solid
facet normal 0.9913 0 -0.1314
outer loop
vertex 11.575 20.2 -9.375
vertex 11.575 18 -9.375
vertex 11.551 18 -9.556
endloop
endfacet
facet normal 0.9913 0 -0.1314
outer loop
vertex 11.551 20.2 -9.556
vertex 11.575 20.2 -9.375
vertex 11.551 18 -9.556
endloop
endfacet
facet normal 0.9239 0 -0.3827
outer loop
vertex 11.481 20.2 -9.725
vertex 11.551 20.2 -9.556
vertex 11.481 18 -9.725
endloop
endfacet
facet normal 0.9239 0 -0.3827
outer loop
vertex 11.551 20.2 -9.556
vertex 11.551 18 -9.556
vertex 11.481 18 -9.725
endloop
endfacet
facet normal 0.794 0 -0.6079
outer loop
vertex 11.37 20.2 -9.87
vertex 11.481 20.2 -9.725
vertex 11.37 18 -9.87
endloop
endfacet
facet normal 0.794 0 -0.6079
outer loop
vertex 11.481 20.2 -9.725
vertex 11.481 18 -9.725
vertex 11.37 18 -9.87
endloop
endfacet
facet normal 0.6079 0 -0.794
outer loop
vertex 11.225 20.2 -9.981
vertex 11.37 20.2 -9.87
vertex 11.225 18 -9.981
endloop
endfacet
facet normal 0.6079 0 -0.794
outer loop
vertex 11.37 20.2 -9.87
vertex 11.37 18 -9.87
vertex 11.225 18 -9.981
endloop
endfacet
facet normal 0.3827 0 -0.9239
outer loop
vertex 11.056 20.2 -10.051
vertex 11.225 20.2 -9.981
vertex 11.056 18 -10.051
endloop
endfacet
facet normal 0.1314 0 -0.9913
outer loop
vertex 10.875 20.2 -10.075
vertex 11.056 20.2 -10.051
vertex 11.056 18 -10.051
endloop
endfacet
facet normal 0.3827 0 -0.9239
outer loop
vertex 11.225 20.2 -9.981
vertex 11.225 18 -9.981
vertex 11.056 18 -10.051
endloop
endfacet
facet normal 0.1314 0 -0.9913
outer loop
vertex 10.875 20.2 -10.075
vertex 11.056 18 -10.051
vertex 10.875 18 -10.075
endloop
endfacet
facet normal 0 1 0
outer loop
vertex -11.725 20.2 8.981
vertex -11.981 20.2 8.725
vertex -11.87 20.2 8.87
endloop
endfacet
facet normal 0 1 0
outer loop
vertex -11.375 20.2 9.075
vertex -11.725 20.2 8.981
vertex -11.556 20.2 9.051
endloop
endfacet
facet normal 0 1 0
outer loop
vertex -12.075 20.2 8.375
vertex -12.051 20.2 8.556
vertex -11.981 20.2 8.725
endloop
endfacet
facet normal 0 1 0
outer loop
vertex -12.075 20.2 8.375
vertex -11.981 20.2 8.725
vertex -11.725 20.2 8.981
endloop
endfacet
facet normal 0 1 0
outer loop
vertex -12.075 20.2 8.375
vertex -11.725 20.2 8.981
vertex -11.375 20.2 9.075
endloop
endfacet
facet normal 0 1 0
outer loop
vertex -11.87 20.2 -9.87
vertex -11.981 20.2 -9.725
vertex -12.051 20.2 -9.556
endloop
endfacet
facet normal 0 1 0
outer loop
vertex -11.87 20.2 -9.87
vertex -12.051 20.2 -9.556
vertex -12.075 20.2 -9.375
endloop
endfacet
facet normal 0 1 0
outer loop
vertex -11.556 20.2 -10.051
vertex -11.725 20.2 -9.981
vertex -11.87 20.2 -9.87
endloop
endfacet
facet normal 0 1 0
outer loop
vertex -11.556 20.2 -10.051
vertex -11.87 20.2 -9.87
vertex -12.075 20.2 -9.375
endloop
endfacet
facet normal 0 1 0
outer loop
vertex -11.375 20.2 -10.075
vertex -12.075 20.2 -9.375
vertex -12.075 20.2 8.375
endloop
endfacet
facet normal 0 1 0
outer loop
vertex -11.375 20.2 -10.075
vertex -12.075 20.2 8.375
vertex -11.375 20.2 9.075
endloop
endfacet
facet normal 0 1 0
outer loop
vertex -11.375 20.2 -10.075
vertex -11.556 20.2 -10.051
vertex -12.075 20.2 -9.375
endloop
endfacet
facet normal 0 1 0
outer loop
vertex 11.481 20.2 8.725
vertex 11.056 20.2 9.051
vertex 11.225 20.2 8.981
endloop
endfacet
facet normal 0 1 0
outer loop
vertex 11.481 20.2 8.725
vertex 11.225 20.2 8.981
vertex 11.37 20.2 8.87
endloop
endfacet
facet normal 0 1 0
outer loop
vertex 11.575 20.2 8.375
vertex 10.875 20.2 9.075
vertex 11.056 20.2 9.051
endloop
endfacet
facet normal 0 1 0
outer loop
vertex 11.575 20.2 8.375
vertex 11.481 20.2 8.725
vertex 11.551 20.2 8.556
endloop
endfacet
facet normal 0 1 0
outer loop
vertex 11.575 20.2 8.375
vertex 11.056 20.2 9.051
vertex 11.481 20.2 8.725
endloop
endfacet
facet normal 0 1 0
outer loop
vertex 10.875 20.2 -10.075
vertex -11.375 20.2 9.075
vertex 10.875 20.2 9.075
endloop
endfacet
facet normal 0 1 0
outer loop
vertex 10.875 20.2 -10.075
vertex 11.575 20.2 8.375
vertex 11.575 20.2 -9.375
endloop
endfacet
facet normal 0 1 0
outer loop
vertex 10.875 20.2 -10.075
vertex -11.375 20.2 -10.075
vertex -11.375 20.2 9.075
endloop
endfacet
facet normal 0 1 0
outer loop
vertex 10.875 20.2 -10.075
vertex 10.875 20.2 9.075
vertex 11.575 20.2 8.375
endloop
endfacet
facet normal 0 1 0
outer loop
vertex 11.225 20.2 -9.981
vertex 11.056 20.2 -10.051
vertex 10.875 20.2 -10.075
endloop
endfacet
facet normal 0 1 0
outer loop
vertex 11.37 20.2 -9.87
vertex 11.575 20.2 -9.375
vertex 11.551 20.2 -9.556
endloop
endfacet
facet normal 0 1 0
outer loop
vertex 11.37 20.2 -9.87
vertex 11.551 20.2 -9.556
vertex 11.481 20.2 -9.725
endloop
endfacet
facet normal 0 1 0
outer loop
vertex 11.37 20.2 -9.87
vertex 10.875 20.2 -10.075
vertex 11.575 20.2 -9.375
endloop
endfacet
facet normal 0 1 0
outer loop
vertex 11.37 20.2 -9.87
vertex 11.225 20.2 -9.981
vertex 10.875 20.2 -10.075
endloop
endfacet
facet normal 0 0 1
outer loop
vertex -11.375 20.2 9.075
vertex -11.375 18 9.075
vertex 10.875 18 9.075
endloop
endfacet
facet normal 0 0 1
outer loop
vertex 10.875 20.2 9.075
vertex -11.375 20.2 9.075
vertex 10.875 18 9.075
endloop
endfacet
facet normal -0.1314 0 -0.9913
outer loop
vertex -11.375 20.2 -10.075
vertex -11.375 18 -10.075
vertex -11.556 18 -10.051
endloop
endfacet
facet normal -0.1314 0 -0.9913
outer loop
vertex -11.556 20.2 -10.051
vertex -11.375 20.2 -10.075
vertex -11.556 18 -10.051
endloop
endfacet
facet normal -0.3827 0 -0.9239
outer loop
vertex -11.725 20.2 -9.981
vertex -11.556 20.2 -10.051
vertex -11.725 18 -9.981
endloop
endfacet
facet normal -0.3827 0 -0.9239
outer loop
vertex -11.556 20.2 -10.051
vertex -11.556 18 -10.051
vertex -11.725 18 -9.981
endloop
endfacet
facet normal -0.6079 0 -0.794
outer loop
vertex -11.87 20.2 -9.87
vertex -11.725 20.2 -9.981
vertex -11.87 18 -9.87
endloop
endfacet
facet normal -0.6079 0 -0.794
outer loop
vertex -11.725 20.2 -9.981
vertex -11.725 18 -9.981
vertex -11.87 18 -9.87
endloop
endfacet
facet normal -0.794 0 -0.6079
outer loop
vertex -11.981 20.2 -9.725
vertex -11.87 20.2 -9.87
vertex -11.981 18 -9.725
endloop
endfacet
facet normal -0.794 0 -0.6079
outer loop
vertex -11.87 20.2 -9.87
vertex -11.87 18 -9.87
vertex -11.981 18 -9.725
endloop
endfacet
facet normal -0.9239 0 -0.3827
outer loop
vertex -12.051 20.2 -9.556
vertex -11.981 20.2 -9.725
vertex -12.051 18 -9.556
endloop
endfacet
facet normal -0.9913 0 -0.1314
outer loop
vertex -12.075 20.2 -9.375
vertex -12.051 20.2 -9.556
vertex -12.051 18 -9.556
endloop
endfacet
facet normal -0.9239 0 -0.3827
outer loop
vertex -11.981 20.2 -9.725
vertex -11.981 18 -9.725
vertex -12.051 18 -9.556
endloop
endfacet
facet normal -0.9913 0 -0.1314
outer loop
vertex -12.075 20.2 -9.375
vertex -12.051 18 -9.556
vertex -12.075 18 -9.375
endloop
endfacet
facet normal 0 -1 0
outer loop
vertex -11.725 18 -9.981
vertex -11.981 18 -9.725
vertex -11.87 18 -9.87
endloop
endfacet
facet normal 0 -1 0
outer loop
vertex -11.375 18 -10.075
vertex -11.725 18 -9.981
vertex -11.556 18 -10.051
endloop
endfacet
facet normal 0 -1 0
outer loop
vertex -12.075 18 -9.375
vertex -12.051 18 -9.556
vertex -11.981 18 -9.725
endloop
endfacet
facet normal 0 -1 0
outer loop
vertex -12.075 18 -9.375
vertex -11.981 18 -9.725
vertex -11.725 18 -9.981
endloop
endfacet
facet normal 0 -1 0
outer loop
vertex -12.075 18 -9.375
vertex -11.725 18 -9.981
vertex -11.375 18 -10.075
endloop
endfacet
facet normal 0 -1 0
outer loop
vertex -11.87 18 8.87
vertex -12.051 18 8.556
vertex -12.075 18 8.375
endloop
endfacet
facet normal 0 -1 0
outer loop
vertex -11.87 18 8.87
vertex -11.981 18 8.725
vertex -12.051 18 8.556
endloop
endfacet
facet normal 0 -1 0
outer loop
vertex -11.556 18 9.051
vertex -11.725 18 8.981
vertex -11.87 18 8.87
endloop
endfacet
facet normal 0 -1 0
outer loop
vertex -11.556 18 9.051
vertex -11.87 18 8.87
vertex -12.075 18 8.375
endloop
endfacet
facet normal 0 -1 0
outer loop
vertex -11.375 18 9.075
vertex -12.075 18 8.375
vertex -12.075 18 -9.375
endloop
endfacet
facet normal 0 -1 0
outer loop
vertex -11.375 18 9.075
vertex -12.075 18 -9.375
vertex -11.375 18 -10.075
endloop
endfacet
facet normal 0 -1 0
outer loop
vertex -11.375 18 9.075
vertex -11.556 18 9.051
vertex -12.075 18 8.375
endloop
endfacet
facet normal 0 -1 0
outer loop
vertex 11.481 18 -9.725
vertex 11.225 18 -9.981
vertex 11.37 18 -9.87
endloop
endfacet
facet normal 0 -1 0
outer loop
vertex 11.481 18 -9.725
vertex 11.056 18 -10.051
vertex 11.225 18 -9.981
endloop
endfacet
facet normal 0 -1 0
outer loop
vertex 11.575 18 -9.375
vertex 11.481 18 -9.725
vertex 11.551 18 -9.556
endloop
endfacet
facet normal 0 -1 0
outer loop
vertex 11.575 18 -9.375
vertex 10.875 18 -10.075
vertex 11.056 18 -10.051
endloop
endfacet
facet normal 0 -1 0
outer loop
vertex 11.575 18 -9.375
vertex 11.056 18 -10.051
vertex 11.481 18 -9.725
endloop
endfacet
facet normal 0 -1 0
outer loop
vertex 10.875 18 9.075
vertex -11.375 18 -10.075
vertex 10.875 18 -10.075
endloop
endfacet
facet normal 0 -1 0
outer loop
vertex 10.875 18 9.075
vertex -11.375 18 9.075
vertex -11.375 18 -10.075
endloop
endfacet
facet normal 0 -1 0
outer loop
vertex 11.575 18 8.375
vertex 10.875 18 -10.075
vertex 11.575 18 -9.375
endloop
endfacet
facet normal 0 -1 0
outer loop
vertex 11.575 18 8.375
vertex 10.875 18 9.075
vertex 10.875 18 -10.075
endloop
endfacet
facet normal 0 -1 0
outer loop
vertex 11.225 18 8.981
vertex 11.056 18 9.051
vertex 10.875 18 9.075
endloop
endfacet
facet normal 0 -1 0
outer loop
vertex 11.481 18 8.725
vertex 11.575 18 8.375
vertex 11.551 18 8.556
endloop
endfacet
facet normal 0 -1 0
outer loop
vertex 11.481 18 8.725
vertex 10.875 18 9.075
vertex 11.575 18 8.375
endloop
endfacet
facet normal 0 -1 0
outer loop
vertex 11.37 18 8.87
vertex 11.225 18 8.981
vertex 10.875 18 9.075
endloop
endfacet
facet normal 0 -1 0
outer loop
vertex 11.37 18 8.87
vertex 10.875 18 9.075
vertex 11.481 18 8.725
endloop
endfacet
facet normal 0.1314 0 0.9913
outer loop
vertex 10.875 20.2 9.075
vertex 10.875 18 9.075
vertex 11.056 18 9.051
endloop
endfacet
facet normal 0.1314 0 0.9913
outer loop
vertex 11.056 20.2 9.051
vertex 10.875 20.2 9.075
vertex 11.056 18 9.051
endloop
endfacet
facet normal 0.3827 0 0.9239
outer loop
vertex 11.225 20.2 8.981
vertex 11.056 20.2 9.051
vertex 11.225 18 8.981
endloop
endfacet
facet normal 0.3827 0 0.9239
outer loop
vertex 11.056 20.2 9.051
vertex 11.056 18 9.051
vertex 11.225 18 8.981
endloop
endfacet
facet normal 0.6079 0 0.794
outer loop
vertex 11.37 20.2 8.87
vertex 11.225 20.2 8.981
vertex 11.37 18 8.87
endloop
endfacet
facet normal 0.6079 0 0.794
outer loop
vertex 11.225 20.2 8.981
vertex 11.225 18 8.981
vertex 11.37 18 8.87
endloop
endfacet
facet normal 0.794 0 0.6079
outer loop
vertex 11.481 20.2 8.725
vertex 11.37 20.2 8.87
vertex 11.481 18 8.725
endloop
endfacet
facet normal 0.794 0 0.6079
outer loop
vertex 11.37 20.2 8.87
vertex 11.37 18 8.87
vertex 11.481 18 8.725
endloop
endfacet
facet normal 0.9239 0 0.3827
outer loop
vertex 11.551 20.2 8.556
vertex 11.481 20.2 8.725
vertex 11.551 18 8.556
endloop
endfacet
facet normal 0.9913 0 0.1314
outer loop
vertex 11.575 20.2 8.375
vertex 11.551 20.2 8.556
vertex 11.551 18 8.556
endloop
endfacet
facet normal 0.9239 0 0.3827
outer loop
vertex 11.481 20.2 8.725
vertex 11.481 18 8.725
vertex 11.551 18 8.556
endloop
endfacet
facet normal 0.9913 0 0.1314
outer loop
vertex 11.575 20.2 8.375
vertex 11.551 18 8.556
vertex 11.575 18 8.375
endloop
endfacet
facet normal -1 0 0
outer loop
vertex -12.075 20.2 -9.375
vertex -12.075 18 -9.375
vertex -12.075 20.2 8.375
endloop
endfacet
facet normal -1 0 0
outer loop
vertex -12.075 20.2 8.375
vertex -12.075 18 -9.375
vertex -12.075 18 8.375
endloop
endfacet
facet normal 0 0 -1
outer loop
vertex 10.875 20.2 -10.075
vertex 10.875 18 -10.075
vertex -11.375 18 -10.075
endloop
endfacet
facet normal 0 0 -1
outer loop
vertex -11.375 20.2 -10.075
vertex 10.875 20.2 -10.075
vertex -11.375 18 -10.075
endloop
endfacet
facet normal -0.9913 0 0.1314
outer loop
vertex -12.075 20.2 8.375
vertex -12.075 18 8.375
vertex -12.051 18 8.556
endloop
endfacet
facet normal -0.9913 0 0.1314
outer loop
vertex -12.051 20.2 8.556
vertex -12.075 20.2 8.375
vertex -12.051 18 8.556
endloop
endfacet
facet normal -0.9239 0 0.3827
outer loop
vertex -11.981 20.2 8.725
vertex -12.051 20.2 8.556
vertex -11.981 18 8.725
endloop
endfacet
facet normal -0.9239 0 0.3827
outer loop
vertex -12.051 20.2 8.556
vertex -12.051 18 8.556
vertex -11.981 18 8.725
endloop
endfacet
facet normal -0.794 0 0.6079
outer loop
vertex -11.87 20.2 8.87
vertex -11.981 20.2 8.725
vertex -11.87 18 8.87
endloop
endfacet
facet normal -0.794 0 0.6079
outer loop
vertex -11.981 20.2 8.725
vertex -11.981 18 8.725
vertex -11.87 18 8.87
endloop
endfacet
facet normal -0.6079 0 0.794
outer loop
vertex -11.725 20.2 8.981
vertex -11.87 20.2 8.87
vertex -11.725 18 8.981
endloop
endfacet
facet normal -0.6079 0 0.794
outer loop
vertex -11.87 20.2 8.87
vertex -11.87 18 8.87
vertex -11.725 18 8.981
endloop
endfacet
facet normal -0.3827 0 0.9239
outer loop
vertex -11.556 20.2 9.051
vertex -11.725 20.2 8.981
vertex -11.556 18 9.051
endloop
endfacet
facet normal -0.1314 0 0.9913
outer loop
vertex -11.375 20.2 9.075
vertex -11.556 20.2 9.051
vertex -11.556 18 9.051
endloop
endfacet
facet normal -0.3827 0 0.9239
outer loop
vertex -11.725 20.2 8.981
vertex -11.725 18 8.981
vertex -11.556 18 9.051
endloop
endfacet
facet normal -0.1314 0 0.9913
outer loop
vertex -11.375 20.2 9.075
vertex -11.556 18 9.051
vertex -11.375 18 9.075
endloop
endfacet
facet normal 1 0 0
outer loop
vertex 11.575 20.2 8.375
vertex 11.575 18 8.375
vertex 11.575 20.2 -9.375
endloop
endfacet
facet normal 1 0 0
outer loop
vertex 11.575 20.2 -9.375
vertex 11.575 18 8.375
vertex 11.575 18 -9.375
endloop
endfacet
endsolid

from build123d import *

# Parameters (mm, degrees)
F_611DOWN_1_START       = 19
F_611DOWN_1_DEPTH       = 1.2
F_611DOWN_1_START_2     = 18
F_611DOWN_1_2_OUTLINE_W = 22.362511336
F_611DOWN_1_2_OUTLINE_H = 15.04
F_611DOWN_1_2_DEPTH     = 1
SKETCH_1_W              = 22.362511336
SKETCH_1_H              = 15.04
EXTRUDE_1_DEPTH         = 1


# Read off the part's stored shape, not the designer's step: 基体零件-611Down-1
with BuildPart() as part:
    # 基体零件-611Down-1 outline → 基体零件-611Down-1 (new body)
    with BuildSketch(Plane(origin=(0, 0, 0), x_dir=(1, 0, 0), z_dir=(0, 1, 0)).offset(F_611DOWN_1_START)):
        with BuildLine():
            Line((-11.375, -9.075), (10.875, -9.075))
            ThreePointArc((10.875, -9.075), (11.369974747, -8.869974747), (11.575, -8.375))
            Line((11.575, -8.375), (11.575, 9.375))
            ThreePointArc((11.575, 9.375), (11.369974747, 9.869974747), (10.875, 10.075))
            Line((10.875, 10.075), (-11.375, 10.075))
            ThreePointArc((-11.375, 10.075), (-11.869974747, 9.869974747), (-12.075, 9.375))
            Line((-12.075, 9.375), (-12.075, -8.375))
            ThreePointArc((-12.075, -8.375), (-11.869974747, -8.869974747), (-11.375, -9.075))
        make_face()
    extrude(amount=F_611DOWN_1_DEPTH)

    # 611Down-1 2 outline → 611Down-1 2 (add)
    with BuildSketch(Plane(origin=(0, 0, 0), x_dir=(1, 0, 0), z_dir=(0, 1, 0)).offset(F_611DOWN_1_START_2)):
        with BuildLine():
            Line((-11.375, -9.075), (10.875, -9.075))
            ThreePointArc((10.875, -9.075), (11.369974747, -8.869974747), (11.575, -8.375))
            Line((11.575, -8.375), (11.575, 9.375))
            ThreePointArc((11.575, 9.375), (11.369974747, 9.869974747), (10.875, 10.075))
            Line((10.875, 10.075), (-11.375, 10.075))
            ThreePointArc((-11.375, 10.075), (-11.869974747, 9.869974747), (-12.075, 9.375))
            Line((-12.075, 9.375), (-12.075, -8.375))
            ThreePointArc((-12.075, -8.375), (-11.869974747, -8.869974747), (-11.375, -9.075))
        make_face()
        with Locations((0.106278341, -0.002552009)):
            Rectangle(F_611DOWN_1_2_OUTLINE_W, F_611DOWN_1_2_OUTLINE_H, mode=Mode.SUBTRACT)
    extrude(amount=F_611DOWN_1_2_DEPTH)

    # 草图1 → 凸台-拉伸1 (add)
    with BuildSketch(Plane.XZ.offset(-18)):
        with Locations((0.106278341, 0.002552009)):
            Rectangle(SKETCH_1_W, SKETCH_1_H)
    extrude(amount=-EXTRUDE_1_DEPTH)


solid = part.part
